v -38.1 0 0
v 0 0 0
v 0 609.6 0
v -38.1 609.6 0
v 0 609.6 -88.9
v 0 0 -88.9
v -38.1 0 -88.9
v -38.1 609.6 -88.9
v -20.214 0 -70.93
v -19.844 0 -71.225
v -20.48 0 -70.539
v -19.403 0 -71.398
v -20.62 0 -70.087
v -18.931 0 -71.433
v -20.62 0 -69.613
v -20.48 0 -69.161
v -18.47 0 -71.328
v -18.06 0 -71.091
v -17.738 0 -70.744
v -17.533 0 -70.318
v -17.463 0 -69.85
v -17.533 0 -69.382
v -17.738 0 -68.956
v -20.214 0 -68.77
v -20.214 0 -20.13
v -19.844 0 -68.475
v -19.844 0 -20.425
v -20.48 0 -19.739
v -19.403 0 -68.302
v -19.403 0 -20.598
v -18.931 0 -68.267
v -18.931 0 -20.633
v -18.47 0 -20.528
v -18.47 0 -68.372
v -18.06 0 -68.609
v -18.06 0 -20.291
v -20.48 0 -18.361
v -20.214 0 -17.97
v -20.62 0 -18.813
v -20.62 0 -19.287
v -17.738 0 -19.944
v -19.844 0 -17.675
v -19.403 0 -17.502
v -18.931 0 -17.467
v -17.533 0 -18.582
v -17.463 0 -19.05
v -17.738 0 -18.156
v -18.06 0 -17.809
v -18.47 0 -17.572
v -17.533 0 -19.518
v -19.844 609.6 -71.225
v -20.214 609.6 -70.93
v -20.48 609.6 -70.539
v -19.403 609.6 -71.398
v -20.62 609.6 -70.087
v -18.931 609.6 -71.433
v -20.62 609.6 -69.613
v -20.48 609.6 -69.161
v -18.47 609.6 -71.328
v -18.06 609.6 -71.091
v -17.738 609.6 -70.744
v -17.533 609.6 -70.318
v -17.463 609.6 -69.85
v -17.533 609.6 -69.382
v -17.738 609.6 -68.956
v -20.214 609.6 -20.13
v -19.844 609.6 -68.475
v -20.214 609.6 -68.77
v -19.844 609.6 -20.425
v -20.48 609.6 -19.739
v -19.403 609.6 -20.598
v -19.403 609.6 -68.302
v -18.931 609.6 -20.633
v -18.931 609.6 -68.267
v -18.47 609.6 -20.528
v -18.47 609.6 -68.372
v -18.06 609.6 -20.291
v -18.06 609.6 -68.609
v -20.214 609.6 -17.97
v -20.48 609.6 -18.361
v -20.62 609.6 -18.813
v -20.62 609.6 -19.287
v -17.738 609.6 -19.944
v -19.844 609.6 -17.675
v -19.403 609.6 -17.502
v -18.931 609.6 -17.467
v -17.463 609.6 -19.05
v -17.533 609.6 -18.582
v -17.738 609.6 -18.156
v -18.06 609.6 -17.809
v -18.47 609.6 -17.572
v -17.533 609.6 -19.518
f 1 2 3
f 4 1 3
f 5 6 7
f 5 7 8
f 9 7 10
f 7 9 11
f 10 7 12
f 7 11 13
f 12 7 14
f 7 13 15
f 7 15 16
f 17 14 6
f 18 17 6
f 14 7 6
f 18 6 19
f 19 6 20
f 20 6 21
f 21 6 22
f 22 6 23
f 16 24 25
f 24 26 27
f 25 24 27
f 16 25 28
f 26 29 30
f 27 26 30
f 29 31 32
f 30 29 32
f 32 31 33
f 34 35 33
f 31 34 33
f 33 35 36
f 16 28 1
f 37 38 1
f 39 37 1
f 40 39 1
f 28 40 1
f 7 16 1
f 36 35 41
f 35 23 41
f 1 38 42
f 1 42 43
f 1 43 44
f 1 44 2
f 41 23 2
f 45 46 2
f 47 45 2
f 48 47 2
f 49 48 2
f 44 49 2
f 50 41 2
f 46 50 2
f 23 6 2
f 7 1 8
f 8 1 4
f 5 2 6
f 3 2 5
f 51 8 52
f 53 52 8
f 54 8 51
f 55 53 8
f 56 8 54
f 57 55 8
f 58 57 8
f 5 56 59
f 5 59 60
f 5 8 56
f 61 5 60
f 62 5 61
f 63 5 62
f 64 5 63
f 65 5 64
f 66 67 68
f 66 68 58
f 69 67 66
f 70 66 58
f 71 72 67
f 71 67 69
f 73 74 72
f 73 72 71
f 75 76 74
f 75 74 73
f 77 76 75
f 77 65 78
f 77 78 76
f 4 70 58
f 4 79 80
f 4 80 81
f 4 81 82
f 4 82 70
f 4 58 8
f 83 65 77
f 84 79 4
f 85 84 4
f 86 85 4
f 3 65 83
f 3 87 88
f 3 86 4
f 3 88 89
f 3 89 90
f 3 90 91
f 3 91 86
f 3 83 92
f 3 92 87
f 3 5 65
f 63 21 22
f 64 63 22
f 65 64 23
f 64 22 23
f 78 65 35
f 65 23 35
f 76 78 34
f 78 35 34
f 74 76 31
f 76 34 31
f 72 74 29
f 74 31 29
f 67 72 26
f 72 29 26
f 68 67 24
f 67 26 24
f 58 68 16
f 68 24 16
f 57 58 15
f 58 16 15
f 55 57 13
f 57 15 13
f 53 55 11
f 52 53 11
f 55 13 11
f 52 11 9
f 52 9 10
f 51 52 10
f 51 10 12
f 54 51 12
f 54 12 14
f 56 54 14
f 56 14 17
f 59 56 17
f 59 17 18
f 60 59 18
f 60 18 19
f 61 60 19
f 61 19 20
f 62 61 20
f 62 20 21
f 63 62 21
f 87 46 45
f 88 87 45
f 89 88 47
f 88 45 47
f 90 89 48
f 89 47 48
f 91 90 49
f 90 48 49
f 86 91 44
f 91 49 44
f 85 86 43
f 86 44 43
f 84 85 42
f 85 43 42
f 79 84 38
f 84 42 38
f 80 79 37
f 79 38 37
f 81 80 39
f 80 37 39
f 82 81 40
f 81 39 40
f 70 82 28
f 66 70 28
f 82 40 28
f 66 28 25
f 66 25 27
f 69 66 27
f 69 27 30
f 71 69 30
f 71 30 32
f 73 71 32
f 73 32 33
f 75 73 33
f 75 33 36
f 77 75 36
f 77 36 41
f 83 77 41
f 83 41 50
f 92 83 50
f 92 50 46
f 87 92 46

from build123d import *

# Parameters (mm, degrees)
F0_W     = 609.6
F0_H     = 88.9
F1_DEPTH = 38.1
F2_R     = 1.5875
F3_DEPTH = 609.601


with BuildPart() as f1:
    # F0 (on Right) → F1 (new body)
    with BuildSketch(Plane.YZ):
        with Locations((304.8, -44.45)):
            Rectangle(F0_W, F0_H)
    extrude(amount=-F1_DEPTH)

    # F2 (on Front) → F3 (cut, through all)
    with BuildSketch(Plane.XZ):
        with Locations((-19.05, -19.05)):
            Circle(F2_R)
        with Locations((-19.05, -69.85)):
            Circle(F2_R)
    extrude(amount=-F3_DEPTH, mode=Mode.SUBTRACT)


solid = f1.part
